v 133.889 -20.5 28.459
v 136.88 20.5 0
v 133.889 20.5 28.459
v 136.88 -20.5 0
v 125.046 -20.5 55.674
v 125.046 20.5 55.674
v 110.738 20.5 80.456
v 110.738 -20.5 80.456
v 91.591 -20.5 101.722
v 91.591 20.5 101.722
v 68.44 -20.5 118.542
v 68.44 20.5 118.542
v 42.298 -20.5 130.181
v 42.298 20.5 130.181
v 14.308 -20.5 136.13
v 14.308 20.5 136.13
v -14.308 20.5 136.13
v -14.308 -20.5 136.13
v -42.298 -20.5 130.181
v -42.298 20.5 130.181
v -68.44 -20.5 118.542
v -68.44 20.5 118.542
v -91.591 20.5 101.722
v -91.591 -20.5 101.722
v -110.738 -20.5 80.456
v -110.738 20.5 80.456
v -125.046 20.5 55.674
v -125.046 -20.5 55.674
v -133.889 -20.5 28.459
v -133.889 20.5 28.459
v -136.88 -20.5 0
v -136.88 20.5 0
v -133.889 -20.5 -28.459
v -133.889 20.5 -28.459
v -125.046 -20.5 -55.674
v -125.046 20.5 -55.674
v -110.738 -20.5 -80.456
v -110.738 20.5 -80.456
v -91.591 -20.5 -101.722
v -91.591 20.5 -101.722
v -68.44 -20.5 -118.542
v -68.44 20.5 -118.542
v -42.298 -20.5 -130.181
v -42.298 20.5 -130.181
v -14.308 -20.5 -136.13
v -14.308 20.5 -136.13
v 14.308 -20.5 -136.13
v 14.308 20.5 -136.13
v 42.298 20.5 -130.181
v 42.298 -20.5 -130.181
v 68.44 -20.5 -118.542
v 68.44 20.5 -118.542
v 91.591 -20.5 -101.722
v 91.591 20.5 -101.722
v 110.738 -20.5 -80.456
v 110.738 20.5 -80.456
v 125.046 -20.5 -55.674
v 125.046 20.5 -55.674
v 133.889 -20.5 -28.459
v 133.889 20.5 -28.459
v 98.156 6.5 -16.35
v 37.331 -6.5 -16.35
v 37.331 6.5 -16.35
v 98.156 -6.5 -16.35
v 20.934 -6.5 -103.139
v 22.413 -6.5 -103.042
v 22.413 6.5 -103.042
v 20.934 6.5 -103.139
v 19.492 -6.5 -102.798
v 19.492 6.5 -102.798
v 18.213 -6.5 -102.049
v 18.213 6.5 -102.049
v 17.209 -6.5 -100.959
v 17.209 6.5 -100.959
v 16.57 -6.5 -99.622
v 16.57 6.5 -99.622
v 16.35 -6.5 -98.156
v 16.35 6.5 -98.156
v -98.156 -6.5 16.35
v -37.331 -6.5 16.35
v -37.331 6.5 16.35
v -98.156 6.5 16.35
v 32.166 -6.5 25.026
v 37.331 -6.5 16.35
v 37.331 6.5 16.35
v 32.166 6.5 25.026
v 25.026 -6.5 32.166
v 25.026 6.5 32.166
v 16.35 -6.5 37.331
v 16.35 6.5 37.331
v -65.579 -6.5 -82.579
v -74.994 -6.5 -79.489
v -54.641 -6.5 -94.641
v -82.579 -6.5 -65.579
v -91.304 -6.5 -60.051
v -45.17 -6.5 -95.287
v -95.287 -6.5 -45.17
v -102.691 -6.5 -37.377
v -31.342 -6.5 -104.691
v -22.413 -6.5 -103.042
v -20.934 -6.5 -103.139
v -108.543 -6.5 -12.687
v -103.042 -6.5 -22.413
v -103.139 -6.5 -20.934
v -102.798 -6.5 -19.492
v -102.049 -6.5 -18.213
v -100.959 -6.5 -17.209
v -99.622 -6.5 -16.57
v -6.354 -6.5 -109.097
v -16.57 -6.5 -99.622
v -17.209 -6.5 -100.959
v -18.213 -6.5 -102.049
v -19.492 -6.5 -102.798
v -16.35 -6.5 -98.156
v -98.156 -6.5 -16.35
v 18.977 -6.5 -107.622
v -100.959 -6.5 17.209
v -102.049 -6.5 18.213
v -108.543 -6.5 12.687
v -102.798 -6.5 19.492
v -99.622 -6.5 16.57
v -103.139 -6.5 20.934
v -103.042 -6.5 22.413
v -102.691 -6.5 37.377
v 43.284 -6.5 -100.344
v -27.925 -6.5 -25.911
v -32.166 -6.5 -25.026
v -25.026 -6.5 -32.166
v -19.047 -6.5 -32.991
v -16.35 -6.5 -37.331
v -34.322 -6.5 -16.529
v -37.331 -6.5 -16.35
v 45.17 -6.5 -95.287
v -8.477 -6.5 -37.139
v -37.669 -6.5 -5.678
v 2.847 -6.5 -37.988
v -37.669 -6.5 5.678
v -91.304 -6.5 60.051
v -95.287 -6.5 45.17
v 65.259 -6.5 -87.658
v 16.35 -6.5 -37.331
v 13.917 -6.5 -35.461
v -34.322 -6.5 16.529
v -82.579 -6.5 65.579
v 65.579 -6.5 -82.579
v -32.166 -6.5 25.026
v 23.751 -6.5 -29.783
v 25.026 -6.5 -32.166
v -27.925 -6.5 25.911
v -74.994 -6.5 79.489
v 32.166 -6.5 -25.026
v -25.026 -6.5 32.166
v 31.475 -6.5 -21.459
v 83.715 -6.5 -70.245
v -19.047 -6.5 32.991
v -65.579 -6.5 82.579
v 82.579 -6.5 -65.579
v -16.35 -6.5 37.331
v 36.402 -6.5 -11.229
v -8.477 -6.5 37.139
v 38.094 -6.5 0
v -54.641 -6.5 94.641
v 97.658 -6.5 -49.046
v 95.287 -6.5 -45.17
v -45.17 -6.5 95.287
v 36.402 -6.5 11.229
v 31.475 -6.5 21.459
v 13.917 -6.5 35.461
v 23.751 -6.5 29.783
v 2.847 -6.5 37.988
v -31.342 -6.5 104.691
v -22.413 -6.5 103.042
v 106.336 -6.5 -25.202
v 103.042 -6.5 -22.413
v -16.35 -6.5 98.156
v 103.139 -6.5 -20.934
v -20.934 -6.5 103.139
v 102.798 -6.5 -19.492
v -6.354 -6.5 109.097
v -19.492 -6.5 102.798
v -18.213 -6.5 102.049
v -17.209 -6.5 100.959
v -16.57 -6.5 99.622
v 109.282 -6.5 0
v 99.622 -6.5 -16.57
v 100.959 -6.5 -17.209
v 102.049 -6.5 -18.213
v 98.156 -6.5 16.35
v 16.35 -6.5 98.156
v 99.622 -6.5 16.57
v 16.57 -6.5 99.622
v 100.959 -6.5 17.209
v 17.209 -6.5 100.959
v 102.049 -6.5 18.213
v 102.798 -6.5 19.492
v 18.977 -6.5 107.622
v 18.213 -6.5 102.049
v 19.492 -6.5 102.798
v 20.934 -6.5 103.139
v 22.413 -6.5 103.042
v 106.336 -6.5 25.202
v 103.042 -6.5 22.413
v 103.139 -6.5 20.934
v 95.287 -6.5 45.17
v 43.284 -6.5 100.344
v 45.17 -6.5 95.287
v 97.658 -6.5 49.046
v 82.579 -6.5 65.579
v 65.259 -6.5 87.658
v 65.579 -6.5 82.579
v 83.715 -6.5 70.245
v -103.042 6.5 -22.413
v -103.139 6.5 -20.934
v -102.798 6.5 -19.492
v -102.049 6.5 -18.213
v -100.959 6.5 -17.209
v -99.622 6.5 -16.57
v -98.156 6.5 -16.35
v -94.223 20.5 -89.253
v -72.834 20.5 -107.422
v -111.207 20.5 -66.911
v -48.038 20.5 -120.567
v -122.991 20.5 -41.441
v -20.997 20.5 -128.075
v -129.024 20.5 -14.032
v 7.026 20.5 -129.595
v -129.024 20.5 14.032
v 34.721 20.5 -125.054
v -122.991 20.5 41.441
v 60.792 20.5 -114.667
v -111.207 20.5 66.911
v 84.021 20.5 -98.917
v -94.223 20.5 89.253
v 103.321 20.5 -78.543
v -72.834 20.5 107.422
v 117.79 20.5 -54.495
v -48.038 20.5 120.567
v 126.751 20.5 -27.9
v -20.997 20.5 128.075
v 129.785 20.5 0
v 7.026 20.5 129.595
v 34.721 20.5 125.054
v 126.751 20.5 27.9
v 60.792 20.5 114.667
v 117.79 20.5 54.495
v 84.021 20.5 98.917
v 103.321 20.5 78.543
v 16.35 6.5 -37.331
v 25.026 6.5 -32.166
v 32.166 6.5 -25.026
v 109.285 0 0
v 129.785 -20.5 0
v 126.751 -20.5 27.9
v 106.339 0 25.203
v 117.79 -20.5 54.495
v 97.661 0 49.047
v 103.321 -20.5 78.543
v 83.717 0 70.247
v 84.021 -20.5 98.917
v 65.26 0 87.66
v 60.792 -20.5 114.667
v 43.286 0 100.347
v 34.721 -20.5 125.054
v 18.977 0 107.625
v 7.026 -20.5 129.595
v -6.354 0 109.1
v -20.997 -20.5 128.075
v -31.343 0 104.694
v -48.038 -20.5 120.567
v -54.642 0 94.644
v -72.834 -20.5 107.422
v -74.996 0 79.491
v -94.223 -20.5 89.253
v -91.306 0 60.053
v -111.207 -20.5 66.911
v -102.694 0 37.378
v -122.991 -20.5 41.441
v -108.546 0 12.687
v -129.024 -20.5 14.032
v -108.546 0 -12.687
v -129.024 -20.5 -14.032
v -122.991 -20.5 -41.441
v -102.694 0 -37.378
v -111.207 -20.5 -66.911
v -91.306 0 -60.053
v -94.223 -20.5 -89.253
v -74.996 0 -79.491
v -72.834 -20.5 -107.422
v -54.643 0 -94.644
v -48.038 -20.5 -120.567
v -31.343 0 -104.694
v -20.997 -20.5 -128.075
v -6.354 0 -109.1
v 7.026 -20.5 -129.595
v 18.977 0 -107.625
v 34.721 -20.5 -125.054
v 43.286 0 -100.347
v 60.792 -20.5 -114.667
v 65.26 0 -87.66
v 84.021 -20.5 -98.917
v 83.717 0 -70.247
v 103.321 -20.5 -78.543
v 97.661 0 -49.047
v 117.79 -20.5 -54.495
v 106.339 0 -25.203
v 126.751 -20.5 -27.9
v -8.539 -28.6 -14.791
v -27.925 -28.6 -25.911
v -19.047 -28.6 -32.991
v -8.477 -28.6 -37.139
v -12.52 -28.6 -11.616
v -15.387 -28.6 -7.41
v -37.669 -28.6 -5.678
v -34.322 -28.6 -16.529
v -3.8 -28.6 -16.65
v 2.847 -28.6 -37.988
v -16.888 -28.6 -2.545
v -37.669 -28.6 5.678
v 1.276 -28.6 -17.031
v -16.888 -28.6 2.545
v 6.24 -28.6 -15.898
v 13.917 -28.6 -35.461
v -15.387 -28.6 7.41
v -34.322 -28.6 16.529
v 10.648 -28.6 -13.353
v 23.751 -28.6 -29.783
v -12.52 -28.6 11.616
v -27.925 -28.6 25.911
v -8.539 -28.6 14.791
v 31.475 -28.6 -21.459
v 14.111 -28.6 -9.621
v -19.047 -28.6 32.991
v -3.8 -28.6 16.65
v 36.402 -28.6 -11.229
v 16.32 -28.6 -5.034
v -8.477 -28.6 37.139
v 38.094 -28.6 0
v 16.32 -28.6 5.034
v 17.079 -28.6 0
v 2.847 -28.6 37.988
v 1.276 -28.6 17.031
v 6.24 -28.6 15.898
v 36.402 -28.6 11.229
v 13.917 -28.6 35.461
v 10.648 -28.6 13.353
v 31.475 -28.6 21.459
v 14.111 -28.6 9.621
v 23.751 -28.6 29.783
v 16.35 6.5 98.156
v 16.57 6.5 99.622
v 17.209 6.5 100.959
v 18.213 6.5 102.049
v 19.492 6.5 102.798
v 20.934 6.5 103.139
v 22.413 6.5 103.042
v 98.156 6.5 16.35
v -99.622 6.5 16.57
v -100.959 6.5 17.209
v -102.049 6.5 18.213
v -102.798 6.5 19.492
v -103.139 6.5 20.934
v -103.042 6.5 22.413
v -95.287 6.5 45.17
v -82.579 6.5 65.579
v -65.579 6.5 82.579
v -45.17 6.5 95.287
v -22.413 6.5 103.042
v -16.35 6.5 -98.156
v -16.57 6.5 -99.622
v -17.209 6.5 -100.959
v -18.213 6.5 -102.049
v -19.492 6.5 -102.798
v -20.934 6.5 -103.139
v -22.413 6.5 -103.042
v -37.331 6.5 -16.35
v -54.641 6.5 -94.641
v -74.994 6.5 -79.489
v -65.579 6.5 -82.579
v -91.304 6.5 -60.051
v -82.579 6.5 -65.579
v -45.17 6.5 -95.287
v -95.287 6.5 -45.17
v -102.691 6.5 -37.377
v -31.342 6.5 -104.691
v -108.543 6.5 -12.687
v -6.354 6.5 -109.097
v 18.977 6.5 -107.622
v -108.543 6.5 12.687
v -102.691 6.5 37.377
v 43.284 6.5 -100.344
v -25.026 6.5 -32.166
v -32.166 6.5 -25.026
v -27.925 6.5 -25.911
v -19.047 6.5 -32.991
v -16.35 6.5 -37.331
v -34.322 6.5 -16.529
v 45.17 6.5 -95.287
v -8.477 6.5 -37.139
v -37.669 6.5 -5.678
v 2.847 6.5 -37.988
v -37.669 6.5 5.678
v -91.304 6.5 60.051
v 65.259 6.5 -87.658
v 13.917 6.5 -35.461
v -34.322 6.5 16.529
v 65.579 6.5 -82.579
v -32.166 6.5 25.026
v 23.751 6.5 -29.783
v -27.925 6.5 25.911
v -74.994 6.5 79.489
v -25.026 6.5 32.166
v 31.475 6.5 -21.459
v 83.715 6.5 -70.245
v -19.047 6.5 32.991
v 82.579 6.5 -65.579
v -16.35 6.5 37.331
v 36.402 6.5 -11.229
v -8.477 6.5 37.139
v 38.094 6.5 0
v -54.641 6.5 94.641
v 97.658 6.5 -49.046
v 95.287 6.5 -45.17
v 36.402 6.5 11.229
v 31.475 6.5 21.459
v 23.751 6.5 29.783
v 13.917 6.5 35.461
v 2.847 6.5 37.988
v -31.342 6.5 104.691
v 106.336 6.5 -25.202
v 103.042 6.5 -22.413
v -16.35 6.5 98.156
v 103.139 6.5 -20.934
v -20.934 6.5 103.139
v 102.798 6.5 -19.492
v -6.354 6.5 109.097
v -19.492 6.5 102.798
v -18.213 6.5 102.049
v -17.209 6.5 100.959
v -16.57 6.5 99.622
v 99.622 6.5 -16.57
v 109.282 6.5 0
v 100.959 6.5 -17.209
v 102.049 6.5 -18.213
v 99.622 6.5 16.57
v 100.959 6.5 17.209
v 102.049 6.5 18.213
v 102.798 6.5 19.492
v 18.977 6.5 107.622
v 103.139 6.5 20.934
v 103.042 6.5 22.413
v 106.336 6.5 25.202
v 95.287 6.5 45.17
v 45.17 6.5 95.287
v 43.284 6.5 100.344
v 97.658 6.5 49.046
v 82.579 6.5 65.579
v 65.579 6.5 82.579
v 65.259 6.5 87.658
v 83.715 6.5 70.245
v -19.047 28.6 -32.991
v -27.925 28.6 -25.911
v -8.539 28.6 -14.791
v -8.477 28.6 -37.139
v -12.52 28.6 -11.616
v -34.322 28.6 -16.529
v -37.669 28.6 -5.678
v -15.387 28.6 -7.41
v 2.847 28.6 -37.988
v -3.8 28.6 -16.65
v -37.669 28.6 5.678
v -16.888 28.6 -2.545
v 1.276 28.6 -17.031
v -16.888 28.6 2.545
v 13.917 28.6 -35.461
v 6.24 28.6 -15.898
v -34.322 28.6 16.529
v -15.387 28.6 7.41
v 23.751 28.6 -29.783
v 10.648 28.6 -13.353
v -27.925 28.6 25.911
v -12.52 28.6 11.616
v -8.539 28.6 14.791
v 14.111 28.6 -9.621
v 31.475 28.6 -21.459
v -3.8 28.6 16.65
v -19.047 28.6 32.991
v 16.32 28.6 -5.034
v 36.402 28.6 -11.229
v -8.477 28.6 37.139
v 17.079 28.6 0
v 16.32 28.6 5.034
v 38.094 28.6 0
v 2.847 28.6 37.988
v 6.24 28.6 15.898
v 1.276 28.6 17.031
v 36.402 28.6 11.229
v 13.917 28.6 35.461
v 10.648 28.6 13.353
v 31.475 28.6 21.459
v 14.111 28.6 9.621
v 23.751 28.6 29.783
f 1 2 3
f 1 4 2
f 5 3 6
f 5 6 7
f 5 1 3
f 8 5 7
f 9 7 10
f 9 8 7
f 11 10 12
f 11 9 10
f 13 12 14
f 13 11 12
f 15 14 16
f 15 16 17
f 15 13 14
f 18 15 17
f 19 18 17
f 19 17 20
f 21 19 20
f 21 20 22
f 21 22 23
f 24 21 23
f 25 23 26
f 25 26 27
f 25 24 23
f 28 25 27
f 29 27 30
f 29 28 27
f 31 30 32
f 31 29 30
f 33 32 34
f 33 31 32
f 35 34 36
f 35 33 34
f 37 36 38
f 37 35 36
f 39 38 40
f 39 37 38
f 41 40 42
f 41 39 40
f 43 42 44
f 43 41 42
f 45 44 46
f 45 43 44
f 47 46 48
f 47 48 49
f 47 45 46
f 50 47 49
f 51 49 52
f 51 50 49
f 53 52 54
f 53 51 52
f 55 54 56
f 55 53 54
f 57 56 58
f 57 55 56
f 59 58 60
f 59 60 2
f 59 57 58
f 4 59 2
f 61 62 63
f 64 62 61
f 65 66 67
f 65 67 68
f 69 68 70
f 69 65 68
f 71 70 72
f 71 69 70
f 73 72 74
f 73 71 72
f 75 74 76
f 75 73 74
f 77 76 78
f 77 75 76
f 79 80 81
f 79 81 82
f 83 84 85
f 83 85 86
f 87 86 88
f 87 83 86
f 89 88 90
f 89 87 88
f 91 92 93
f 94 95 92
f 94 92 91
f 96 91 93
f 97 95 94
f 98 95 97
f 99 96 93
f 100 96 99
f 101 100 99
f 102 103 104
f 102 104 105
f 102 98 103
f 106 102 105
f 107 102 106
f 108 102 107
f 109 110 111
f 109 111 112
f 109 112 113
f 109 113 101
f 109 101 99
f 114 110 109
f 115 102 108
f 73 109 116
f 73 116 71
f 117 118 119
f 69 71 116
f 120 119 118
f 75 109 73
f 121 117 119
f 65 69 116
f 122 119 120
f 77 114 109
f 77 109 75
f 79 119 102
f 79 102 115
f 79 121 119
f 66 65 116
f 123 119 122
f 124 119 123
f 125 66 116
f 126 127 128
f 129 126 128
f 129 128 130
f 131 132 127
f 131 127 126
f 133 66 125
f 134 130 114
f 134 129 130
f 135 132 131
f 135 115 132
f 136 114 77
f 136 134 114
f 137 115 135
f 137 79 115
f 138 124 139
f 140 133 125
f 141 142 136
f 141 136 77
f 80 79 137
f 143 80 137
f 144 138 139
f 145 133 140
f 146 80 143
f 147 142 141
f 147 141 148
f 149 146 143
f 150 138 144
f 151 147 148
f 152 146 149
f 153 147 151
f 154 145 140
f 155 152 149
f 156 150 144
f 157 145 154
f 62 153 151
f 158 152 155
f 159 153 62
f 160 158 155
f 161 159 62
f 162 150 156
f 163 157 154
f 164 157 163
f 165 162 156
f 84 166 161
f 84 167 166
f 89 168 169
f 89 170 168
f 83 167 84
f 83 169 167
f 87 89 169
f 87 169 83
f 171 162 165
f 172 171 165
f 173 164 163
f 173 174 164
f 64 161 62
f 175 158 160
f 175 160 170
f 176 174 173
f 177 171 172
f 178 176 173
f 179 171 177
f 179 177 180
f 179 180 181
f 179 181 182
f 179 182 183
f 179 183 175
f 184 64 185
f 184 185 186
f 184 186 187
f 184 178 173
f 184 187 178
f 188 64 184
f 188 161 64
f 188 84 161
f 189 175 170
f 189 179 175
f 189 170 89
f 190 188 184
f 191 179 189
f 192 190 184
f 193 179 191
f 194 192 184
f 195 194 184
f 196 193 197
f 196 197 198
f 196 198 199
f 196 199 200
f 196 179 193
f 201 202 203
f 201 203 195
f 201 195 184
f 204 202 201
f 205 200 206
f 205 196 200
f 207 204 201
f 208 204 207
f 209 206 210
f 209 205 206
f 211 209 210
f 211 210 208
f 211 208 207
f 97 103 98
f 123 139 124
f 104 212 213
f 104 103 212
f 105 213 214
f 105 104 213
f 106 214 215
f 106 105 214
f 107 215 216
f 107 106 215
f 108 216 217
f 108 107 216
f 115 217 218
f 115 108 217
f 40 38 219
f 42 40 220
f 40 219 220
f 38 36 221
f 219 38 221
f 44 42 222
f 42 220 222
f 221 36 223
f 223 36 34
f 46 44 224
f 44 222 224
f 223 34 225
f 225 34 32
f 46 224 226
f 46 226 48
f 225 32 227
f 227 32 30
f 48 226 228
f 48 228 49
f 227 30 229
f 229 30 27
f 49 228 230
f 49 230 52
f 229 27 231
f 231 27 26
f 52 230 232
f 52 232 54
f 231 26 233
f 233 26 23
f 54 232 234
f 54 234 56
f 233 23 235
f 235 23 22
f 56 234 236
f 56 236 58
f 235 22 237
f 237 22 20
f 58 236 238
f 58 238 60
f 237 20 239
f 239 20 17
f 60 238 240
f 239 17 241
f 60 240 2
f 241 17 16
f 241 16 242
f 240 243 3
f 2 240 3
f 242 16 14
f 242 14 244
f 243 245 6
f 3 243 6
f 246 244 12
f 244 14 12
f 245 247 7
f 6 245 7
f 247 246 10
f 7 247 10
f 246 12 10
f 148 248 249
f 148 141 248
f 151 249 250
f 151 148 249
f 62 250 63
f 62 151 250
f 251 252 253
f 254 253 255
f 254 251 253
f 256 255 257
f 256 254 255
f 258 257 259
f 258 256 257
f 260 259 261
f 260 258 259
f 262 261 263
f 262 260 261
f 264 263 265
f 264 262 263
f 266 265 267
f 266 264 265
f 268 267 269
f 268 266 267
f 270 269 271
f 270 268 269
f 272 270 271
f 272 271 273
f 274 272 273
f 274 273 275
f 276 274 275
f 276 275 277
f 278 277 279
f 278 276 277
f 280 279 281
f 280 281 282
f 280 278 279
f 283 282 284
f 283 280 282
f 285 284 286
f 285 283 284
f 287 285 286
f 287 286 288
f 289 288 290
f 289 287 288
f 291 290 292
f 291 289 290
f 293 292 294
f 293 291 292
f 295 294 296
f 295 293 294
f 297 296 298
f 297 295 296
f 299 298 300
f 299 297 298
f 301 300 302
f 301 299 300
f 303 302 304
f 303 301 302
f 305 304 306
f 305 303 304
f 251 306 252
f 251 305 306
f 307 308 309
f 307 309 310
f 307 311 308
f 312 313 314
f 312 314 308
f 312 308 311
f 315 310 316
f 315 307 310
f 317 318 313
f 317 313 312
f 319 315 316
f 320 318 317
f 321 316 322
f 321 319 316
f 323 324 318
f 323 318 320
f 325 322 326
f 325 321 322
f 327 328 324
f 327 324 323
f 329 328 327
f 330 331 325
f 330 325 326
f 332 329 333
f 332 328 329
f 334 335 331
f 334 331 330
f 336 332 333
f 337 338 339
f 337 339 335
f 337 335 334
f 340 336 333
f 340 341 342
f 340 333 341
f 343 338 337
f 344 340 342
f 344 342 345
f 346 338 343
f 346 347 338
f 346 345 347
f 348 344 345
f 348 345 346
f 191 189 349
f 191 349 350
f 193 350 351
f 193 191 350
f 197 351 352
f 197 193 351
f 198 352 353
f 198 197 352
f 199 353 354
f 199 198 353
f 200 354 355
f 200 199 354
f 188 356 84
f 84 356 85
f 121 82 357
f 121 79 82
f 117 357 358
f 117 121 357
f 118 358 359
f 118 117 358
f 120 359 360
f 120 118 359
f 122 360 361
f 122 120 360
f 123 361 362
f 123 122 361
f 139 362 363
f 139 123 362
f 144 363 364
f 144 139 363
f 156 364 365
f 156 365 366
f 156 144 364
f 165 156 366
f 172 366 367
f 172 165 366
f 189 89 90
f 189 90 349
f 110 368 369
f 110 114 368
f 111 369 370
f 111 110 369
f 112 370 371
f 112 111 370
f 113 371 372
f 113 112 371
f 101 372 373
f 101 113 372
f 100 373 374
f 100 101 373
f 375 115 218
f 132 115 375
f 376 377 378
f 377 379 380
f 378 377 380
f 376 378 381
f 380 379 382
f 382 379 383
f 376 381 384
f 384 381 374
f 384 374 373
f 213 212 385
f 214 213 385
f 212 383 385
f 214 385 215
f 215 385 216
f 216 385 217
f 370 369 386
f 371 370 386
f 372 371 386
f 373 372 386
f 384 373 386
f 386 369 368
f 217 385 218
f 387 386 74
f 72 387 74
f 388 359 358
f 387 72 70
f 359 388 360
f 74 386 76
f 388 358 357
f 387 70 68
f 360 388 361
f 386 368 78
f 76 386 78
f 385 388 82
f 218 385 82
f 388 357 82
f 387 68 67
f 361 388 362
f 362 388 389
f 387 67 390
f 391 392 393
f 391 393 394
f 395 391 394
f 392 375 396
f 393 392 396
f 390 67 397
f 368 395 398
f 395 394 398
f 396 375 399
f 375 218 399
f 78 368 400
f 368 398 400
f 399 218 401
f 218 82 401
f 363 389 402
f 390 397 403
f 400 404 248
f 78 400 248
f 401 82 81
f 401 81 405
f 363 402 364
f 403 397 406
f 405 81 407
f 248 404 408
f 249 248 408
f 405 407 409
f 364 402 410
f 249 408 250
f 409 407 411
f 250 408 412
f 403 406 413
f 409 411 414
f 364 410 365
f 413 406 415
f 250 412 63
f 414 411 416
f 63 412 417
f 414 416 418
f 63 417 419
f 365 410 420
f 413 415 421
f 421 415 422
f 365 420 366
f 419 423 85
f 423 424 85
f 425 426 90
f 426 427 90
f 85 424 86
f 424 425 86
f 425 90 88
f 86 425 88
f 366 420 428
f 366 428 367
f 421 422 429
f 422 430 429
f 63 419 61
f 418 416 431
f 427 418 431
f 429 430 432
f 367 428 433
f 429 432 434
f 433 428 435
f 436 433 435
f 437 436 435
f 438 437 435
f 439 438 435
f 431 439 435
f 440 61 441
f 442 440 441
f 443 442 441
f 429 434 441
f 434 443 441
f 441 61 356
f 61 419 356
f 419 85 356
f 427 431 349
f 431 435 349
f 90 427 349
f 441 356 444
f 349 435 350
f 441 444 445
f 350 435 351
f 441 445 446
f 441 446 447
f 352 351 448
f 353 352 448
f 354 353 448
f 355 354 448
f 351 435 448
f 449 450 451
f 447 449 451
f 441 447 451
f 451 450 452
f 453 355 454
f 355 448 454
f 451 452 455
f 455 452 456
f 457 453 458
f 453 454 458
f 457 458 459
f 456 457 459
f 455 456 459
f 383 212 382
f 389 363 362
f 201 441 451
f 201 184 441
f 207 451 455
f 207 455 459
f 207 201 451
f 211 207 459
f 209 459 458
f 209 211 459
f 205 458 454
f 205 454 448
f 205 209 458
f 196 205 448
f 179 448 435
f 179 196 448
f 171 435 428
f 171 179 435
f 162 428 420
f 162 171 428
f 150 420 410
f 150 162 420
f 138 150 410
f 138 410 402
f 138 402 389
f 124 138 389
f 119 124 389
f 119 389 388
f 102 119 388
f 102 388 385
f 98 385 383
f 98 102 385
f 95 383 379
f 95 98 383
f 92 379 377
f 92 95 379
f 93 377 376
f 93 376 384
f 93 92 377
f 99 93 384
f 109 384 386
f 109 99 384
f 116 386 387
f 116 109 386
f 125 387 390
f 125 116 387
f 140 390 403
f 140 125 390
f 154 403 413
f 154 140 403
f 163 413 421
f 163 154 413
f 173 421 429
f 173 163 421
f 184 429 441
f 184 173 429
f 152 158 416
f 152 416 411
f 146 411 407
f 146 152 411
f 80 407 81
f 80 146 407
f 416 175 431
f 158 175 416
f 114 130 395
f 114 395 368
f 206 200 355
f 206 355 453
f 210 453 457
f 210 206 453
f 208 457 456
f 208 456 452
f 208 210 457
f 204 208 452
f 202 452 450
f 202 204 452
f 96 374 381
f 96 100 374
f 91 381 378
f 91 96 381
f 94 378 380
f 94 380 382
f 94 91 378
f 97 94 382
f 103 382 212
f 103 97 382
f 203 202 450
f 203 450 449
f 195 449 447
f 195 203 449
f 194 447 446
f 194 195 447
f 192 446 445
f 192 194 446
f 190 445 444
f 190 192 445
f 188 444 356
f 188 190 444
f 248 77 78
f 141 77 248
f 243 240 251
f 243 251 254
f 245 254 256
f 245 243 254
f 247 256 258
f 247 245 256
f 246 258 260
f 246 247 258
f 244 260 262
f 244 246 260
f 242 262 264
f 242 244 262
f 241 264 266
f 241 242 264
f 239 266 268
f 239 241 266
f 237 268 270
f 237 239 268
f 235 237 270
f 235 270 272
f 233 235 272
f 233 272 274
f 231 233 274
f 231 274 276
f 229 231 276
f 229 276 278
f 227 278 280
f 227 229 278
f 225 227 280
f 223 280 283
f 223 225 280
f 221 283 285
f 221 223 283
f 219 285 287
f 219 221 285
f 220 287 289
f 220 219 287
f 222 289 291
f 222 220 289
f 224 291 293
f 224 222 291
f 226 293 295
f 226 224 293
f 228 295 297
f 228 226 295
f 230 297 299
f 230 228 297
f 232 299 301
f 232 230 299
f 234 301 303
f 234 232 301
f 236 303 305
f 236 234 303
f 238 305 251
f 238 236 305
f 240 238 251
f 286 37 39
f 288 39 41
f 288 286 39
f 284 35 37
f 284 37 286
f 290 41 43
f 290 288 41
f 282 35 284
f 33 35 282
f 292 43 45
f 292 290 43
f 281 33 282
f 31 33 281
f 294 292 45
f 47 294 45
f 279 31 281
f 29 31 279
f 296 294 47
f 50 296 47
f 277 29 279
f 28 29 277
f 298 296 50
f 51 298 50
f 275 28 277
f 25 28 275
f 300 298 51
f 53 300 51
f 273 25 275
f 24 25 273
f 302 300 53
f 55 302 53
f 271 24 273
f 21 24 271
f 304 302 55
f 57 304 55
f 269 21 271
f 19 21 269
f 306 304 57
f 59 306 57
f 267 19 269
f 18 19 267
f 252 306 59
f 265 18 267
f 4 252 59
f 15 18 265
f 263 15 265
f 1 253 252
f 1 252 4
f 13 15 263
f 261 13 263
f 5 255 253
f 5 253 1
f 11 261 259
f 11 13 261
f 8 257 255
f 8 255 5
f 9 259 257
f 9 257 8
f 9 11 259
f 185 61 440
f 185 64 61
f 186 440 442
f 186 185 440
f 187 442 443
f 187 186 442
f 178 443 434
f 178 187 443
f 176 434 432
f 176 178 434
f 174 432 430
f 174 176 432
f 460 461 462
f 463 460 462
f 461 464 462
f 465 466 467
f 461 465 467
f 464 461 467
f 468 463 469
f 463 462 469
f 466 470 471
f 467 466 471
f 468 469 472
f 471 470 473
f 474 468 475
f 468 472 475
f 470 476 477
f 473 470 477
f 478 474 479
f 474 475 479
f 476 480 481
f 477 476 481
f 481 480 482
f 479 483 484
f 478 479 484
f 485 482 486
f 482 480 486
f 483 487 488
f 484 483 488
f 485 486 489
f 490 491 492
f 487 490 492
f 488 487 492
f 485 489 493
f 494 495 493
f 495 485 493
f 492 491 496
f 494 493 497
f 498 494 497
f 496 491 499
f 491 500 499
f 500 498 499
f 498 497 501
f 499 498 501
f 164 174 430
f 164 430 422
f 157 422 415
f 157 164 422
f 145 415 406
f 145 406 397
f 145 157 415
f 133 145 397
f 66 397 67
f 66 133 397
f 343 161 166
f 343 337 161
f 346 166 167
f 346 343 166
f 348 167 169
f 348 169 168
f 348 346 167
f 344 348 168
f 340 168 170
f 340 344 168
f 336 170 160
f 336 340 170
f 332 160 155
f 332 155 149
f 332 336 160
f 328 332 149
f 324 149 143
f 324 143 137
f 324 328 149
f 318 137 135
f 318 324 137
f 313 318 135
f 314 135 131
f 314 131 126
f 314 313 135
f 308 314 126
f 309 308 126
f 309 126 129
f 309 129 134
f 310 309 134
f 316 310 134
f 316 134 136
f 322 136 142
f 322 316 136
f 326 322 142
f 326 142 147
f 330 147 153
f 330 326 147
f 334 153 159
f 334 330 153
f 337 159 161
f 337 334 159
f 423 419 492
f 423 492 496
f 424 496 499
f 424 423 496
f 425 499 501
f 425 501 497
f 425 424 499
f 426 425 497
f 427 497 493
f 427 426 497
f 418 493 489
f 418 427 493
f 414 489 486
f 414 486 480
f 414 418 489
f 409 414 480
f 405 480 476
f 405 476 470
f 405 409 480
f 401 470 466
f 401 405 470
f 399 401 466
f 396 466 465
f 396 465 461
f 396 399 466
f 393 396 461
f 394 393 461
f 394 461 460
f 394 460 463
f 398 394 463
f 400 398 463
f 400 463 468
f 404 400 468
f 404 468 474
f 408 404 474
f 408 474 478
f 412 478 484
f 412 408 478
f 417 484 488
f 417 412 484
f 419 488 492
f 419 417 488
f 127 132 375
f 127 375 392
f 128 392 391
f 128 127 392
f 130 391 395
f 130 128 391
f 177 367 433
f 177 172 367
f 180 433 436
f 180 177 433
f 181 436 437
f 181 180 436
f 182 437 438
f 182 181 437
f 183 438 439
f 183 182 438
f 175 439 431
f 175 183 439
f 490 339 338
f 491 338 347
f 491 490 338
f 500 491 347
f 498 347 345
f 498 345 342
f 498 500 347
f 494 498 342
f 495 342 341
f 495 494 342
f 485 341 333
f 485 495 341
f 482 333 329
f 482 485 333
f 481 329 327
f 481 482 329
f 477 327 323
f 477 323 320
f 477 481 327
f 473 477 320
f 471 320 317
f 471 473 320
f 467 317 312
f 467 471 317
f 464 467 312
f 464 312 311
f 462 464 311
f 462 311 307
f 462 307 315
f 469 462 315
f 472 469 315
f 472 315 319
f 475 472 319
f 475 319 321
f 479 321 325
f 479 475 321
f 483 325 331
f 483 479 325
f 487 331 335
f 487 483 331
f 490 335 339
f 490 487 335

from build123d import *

# Parameters (mm, degrees)
F0_R     = 109.2819211761
F0_R_2   = 38.0943795336
F1_DEPTH = 6.5
F0_R_3   = 17.0786254613
F2_DEPTH = 28.6
F3_R     = 130.7
F3_R_2   = 109.285
F4_DEPTH = 20.5
F5_SIZE  = 20.49999
F3_R_3   = 136.88
F6_DEPTH = 20.5


# Not quite as in the source:
# - a fillet or chamfer is up to 0.001 mm smaller than in the source, because OpenCascade refuses the exact size


with BuildPart() as f1:
    # F0 (on Front) → F1 (new body, symmetric)
    with BuildSketch(Plane.XZ):
        Circle(F0_R)
        with BuildLine():
            Line((-98.1561071561, -16.35), (-37.3311538661, -16.35))
            ThreePointArc((-37.3311538661, -16.35), (-28.8178551334, -28.8178551334), (-16.35, -37.3311538661))
            Line((-16.35, -37.3311538661), (-16.35, -98.1561071561))
            ThreePointArc((-16.35, -98.1561071561), (-18.2126065992, -102.0492758718), (-22.4127050594, -103.0418678908))
            ThreePointArc((-22.4127050594, -103.0418678908), (-74.5652596271, -74.5652596271), (-103.0418678908, -22.4127050594))
            ThreePointArc((-103.0418678908, -22.4127050594), (-102.0492758718, -18.2126065992), (-98.1561071561, -16.35))
        make_face(mode=Mode.SUBTRACT)
        Circle(F0_R_2, mode=Mode.SUBTRACT)
        with BuildLine():
            ThreePointArc((103.0418678908, -22.4127050594), (74.5652596271, -74.5652596271), (22.4127050594, -103.0418678908))
            ThreePointArc((22.4127050594, -103.0418678908), (18.2126065992, -102.0492758718), (16.35, -98.1561071561))
            Line((16.35, -98.1561071561), (16.35, -37.3311538661))
            ThreePointArc((16.35, -37.3311538661), (28.8178551334, -28.8178551334), (37.3311538661, -16.35))
            Line((37.3311538661, -16.35), (98.1561071561, -16.35))
            ThreePointArc((98.1561071561, -16.35), (102.0492758718, -18.2126065992), (103.0418678908, -22.4127050594))
        make_face(mode=Mode.SUBTRACT)
        with BuildLine():
            Line((-16.35, 98.1561071561), (-16.35, 37.3311538661))
            ThreePointArc((-16.35, 37.3311538661), (-28.8178551334, 28.8178551334), (-37.3311538661, 16.35))
            Line((-37.3311538661, 16.35), (-98.1561071561, 16.35))
            ThreePointArc((-98.1561071561, 16.35), (-102.0492758718, 18.2126065992), (-103.0418678908, 22.4127050594))
            ThreePointArc((-103.0418678908, 22.4127050594), (-74.5652596271, 74.5652596271), (-22.4127050594, 103.0418678908))
            ThreePointArc((-22.4127050594, 103.0418678908), (-18.2126065992, 102.0492758718), (-16.35, 98.1561071561))
        make_face(mode=Mode.SUBTRACT)
        with BuildLine():
            Line((98.1561071561, 16.35), (37.3311538661, 16.35))
            ThreePointArc((37.3311538661, 16.35), (28.8178551334, 28.8178551334), (16.35, 37.3311538661))
            Line((16.35, 37.3311538661), (16.35, 98.1561071561))
            ThreePointArc((16.35, 98.1561071561), (18.2126065992, 102.0492758718), (22.4127050594, 103.0418678908))
            ThreePointArc((22.4127050594, 103.0418678908), (74.5652596271, 74.5652596271), (103.0418678908, 22.4127050594))
            ThreePointArc((103.0418678908, 22.4127050594), (102.0492758718, 18.2126065992), (98.1561071561, 16.35))
        make_face(mode=Mode.SUBTRACT)
    extrude(amount=F1_DEPTH, both=True)

    # F0 (on Front) → F2 (join, symmetric)
    with BuildSketch(Plane.XZ):
        Circle(F0_R_2)
        Circle(F0_R_3, mode=Mode.SUBTRACT)
    extrude(amount=F2_DEPTH, both=True)


with BuildPart() as f4:
    # F3 (on face) → F4 (new body, symmetric)
    with BuildSketch(Plane.XZ):
        Circle(F3_R)
        Circle(F3_R_2, mode=Mode.SUBTRACT)
    extrude(amount=F4_DEPTH, both=True)

    # F5 (size 20.5 in the source; OpenCascade refuses exactly that, so slightly less here)
    f5_edges = [f4.edges().sort_by_distance(p)[0] for p in [
        (-109.285, -20.5, 0),
        (109.285, 0, 0),
        (-109.285, 20.5, 0),
    ]]
    chamfer(f5_edges, length=F5_SIZE)

    # F3 (on face) → F6 (join, symmetric)
    with BuildSketch(Plane.XZ):
        Circle(F3_R_3)
        Circle(F3_R, mode=Mode.SUBTRACT)
    extrude(amount=F6_DEPTH, both=True)


solid = Compound([f1.part, f4.part])
